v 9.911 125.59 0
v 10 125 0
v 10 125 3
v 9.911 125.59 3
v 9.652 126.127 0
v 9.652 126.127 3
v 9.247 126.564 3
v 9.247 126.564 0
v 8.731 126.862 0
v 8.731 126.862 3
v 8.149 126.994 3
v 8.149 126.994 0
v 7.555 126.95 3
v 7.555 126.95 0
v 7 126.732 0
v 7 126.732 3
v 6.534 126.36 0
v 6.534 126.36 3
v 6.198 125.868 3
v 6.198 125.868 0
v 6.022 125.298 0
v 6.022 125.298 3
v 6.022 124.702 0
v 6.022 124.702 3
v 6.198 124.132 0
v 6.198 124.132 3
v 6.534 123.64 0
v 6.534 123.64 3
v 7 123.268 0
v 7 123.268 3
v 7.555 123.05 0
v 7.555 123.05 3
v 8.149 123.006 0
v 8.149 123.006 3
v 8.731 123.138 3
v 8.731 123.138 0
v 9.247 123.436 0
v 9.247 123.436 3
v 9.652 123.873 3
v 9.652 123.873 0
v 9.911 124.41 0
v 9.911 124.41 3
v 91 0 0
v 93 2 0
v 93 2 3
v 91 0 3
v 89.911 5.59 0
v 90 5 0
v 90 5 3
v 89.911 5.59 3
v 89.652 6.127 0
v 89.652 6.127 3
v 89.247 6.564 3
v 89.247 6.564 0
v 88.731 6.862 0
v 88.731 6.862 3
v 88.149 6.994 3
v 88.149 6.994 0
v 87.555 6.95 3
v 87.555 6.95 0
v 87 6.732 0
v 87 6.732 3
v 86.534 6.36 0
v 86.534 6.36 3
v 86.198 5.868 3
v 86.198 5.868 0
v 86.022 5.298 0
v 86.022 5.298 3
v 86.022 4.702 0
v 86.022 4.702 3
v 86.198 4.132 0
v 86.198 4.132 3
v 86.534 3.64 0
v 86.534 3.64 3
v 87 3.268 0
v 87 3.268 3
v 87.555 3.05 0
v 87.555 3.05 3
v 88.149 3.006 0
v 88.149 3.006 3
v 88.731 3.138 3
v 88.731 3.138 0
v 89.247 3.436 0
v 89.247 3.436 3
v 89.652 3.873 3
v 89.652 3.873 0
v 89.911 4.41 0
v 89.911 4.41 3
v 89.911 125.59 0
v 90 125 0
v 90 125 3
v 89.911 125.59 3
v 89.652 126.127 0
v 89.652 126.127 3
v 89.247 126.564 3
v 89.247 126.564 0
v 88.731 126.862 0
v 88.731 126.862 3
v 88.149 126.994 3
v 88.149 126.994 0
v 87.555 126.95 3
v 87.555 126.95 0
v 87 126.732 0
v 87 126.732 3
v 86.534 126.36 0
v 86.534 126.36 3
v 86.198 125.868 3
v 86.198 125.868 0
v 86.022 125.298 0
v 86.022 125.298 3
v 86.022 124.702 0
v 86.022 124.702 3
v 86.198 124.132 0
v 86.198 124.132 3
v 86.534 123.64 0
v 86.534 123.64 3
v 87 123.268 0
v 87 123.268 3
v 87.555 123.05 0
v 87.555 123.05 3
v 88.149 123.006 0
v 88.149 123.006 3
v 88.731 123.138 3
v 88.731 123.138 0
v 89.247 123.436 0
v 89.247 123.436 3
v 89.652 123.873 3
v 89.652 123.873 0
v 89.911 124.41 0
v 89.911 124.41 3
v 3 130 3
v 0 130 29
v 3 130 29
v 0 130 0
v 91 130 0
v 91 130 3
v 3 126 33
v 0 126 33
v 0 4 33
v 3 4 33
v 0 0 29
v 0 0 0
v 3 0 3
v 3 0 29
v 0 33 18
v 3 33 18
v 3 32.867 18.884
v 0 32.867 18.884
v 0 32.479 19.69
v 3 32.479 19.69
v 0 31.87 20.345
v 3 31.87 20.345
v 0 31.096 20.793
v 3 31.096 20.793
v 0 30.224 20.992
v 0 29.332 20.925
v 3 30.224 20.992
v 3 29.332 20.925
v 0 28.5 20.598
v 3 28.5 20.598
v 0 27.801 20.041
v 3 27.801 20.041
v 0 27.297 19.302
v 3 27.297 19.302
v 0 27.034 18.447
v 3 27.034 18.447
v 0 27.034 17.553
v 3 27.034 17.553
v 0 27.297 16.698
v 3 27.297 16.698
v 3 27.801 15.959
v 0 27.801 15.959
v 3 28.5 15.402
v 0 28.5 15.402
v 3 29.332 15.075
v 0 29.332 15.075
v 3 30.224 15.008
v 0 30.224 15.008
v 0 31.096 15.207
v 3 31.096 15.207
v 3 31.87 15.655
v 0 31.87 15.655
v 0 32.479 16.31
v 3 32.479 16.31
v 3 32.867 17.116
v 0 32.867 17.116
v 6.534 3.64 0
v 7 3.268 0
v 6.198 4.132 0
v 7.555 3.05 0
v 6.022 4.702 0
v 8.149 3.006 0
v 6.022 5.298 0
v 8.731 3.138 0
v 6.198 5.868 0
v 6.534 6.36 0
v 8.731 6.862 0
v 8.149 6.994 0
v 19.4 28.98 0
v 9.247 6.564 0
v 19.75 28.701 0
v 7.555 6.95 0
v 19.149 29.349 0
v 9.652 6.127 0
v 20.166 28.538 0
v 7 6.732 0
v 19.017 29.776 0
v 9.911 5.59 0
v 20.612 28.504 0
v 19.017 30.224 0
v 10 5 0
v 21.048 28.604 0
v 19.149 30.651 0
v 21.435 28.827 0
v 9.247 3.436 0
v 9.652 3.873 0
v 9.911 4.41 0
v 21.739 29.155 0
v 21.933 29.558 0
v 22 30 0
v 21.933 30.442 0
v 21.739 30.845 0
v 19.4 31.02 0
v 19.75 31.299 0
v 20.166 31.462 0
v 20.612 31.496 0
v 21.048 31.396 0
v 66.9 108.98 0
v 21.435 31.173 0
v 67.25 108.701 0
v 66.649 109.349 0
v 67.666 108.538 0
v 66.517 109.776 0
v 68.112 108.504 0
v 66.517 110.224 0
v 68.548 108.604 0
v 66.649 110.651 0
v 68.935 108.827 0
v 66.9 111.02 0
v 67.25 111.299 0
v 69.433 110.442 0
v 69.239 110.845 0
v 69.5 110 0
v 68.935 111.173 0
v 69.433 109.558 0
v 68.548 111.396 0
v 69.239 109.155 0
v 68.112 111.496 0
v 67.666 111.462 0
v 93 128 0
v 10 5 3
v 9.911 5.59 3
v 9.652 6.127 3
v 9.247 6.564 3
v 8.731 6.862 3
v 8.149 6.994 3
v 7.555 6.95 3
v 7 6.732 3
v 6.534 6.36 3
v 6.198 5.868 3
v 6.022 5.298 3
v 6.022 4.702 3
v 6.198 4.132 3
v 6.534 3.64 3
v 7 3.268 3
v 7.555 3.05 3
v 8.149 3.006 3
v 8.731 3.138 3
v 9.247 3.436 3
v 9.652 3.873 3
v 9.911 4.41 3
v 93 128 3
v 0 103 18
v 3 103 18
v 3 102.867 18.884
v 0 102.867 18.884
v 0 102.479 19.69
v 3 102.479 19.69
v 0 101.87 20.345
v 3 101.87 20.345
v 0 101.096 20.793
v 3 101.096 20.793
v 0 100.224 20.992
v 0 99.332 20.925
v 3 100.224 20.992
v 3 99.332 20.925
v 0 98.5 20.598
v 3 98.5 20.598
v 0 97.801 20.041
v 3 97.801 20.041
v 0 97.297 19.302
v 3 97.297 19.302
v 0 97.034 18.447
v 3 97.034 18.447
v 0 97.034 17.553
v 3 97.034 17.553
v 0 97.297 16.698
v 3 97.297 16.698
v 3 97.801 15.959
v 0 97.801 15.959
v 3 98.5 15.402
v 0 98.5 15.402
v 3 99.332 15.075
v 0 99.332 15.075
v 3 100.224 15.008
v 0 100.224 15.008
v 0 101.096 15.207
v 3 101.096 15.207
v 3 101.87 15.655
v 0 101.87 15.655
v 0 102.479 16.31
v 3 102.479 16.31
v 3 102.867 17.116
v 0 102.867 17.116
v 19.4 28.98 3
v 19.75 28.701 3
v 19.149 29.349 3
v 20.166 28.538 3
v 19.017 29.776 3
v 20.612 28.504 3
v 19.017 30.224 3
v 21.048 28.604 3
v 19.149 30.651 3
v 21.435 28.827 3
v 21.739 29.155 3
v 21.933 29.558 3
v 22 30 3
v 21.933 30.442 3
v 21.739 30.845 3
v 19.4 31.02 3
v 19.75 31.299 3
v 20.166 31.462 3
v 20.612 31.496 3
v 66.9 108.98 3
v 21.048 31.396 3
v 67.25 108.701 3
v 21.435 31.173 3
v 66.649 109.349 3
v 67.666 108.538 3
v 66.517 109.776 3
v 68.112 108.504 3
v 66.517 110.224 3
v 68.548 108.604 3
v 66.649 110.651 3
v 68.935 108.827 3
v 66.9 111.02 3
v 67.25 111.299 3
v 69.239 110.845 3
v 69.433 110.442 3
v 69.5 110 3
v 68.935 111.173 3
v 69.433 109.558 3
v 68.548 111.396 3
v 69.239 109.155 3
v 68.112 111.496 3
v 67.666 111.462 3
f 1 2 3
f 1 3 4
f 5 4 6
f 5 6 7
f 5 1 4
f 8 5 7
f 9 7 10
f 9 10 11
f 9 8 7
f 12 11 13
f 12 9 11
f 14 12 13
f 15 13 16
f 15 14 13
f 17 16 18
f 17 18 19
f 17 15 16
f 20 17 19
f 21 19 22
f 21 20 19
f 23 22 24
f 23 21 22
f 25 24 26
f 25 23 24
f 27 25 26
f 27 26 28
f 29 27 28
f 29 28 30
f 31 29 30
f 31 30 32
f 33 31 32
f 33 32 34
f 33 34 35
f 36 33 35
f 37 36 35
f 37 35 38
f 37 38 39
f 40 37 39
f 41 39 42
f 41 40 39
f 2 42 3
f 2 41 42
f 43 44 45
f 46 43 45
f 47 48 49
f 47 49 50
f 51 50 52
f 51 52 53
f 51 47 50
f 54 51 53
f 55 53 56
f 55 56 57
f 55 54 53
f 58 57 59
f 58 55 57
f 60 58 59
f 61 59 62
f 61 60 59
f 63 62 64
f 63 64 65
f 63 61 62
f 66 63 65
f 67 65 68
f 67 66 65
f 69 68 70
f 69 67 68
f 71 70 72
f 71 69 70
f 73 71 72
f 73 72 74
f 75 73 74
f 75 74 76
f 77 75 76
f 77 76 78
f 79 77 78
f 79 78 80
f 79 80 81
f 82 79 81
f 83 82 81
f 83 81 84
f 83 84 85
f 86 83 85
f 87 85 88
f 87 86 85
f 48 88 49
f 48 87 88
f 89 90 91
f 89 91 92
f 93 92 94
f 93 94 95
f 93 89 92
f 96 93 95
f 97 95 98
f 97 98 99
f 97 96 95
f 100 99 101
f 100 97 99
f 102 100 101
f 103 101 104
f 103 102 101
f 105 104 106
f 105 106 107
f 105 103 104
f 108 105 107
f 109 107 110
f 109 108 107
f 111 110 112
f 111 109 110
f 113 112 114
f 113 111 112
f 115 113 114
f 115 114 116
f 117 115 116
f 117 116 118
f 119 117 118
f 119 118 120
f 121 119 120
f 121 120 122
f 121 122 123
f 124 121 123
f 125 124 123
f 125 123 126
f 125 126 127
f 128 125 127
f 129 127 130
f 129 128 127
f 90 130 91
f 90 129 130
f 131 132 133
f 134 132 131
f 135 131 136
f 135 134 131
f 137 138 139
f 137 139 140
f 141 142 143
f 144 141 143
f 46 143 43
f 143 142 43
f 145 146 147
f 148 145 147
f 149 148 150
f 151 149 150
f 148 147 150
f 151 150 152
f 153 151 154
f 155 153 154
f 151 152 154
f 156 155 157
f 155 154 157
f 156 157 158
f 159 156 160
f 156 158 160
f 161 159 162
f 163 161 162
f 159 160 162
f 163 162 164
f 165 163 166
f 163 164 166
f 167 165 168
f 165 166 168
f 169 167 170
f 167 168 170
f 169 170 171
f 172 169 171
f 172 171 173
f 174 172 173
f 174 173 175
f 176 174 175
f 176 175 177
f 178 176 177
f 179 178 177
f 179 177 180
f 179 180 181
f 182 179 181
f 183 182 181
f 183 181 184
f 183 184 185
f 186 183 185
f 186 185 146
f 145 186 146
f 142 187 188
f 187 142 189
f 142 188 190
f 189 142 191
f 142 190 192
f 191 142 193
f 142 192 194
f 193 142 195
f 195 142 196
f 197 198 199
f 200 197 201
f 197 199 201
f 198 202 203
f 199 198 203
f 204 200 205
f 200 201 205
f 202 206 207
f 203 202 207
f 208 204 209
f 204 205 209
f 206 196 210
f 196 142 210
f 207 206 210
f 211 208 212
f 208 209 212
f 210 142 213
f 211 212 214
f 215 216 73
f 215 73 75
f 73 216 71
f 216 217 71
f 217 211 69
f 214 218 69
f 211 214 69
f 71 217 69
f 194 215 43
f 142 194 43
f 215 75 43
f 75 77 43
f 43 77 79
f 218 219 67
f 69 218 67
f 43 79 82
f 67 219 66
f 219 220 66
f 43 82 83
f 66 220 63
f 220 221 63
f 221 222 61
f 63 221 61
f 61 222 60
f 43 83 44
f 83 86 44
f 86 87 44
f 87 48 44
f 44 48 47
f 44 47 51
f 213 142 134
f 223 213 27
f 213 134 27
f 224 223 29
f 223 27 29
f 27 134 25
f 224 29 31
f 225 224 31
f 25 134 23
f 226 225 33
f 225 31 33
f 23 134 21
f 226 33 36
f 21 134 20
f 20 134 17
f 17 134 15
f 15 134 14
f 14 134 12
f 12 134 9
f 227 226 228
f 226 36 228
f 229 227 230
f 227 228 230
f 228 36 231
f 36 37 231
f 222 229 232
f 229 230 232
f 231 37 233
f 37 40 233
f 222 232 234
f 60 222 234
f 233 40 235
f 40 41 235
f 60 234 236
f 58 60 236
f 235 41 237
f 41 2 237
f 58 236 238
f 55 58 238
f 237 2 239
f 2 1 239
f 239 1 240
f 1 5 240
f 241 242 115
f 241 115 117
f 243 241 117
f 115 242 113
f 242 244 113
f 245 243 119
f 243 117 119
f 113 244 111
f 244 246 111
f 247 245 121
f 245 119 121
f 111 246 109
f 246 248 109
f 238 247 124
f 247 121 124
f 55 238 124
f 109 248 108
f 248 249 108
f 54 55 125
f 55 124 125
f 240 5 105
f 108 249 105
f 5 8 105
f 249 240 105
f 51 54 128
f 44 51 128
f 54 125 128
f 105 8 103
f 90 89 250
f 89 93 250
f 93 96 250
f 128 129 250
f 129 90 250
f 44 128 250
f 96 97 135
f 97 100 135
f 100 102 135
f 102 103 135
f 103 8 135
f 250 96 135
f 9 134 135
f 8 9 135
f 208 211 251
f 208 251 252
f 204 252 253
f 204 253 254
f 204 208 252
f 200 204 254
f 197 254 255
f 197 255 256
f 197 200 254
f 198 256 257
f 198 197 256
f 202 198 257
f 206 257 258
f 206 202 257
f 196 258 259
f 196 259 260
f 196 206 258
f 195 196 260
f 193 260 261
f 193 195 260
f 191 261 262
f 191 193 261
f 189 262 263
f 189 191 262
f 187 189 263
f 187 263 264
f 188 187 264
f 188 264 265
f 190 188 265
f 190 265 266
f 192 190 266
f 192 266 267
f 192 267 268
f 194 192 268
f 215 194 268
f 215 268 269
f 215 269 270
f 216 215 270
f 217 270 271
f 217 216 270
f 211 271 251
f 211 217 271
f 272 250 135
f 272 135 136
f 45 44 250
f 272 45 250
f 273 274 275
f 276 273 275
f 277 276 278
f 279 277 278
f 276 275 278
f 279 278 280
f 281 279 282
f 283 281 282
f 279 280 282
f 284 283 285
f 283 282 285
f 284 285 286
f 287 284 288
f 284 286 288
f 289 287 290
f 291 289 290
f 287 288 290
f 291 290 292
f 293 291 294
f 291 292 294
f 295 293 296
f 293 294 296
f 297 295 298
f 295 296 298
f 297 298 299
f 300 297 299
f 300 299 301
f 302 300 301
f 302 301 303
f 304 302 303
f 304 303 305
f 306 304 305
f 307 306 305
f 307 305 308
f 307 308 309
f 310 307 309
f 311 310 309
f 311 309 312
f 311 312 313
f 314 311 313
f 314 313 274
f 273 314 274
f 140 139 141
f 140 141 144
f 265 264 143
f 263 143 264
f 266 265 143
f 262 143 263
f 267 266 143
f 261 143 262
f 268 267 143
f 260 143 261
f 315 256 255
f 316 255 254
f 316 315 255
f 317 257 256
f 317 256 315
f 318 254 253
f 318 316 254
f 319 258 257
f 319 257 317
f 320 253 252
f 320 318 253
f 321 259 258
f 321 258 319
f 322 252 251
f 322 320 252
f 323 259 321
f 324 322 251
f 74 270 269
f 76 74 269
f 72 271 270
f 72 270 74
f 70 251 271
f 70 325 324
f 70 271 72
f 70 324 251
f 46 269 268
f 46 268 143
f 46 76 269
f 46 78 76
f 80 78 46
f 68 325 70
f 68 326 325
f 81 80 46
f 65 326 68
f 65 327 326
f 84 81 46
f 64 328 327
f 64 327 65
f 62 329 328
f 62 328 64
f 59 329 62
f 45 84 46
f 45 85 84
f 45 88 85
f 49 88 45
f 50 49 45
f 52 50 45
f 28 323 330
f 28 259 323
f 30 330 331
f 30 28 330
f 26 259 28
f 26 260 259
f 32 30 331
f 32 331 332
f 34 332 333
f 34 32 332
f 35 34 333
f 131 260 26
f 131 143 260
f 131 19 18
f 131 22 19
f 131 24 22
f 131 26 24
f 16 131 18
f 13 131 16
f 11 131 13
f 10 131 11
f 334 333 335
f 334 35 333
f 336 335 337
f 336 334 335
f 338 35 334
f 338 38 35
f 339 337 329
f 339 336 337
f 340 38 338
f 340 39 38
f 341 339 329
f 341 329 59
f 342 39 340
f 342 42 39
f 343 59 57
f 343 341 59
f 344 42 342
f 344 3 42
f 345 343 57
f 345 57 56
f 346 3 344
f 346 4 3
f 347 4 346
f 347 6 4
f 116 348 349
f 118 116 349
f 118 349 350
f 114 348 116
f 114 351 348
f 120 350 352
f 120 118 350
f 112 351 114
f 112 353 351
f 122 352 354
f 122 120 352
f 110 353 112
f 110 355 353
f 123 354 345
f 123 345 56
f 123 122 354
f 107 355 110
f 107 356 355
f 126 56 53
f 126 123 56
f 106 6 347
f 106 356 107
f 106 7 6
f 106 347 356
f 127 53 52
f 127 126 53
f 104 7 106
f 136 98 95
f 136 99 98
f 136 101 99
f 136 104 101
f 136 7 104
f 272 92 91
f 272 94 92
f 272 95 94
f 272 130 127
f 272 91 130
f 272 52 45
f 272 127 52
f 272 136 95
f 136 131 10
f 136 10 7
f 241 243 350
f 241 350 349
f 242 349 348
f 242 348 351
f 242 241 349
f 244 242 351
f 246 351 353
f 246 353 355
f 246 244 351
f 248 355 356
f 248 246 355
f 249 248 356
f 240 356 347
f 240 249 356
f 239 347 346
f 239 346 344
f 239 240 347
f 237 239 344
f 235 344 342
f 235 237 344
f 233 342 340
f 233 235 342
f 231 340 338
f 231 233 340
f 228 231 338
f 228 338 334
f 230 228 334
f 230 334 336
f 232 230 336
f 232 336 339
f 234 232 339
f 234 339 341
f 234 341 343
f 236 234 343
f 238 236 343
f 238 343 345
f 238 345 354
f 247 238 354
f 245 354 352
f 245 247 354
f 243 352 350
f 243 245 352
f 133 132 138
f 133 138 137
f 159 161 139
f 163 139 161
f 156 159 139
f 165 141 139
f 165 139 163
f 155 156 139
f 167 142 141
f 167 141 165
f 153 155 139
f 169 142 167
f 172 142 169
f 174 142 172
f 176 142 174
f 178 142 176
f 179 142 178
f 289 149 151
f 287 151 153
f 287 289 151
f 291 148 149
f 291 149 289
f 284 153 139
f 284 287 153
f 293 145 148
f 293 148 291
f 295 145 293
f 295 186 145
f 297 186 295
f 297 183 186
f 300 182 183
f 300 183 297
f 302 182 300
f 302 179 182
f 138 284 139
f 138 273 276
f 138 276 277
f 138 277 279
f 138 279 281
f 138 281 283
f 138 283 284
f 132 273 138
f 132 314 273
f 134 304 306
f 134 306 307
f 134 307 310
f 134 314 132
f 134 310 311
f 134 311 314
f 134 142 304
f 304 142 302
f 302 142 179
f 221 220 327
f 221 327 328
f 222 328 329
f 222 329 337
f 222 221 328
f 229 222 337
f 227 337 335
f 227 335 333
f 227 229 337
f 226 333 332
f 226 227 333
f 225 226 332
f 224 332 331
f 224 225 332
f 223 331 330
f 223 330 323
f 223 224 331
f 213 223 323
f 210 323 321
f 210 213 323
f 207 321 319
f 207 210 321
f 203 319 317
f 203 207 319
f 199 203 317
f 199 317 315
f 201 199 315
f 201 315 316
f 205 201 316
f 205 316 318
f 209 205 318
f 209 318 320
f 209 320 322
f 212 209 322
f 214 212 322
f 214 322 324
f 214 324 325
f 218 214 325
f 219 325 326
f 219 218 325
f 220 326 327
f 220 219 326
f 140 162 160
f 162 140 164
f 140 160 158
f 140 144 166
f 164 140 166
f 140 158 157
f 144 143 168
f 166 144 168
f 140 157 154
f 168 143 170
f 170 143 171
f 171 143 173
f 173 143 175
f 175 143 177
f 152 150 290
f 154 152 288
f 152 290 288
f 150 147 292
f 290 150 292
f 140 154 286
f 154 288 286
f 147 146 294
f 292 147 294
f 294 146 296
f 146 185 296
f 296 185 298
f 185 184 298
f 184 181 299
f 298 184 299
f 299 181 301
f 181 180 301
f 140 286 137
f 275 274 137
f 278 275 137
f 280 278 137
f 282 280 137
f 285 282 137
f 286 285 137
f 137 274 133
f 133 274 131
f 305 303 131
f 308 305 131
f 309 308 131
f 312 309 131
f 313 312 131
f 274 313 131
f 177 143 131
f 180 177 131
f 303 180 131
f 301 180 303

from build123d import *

# Parameters (mm, degrees)
SKETCH_W        = 93
SKETCH_H        = 130
SKETCH_R        = 1.5
SKETCH_R_2      = 2
PAD_DEPTH       = 3
SKETCH001_W     = 3
SKETCH001_H     = 130
PAD001_DEPTH    = 30
SKETCH002_R     = 3
POCKET_DEPTH    = 3.001
CHAMFER_SIZE    = 2
CHAMFER001_SIZE = 4


with BuildPart() as part:
    # Sketch → Pad (new body)
    with BuildSketch(Plane.XY):
        with Locations((46.5, 65)):
            Rectangle(SKETCH_W, SKETCH_H)
        with Locations((20.5, 30)):
            Circle(SKETCH_R, mode=Mode.SUBTRACT)
        with Locations((68, 110)):
            Circle(SKETCH_R, mode=Mode.SUBTRACT)
        with Locations((8, 125)):
            Circle(SKETCH_R_2, mode=Mode.SUBTRACT)
        with Locations((88, 125)):
            Circle(SKETCH_R_2, mode=Mode.SUBTRACT)
        with Locations((88, 5)):
            Circle(SKETCH_R_2, mode=Mode.SUBTRACT)
        with Locations((8, 5)):
            Circle(SKETCH_R_2, mode=Mode.SUBTRACT)
    extrude(amount=PAD_DEPTH)

    # Sketch001 (on Face12 of Pad) → Pad001 (join)
    with BuildSketch(Plane.XY.offset(3)):
        with Locations((1.5, 65)):
            Rectangle(SKETCH001_W, SKETCH001_H)
    extrude(amount=PAD001_DEPTH)

    # Sketch002 (on Face15 of Pad001) → Pocket (cut, through all)
    with BuildSketch(Plane.YZ.offset(3)):
        with Locations((30, 18)):
            Circle(SKETCH002_R)
        with Locations((100, 18)):
            Circle(SKETCH002_R)
    extrude(amount=-POCKET_DEPTH, mode=Mode.SUBTRACT)

    # Chamfer
    chamfer_edges = [part.edges().sort_by_distance(p)[0] for p in [
        (93, 0, 1.5),
        (93, 130, 1.5),
    ]]
    chamfer(chamfer_edges, length=CHAMFER_SIZE)

    # Chamfer001
    chamfer001_edges = [part.edges().sort_by_distance(p)[0] for p in [
        (1.5, 0, 33),
        (1.5, 130, 33),
    ]]
    chamfer(chamfer001_edges, length=CHAMFER001_SIZE)


solid = part.part
